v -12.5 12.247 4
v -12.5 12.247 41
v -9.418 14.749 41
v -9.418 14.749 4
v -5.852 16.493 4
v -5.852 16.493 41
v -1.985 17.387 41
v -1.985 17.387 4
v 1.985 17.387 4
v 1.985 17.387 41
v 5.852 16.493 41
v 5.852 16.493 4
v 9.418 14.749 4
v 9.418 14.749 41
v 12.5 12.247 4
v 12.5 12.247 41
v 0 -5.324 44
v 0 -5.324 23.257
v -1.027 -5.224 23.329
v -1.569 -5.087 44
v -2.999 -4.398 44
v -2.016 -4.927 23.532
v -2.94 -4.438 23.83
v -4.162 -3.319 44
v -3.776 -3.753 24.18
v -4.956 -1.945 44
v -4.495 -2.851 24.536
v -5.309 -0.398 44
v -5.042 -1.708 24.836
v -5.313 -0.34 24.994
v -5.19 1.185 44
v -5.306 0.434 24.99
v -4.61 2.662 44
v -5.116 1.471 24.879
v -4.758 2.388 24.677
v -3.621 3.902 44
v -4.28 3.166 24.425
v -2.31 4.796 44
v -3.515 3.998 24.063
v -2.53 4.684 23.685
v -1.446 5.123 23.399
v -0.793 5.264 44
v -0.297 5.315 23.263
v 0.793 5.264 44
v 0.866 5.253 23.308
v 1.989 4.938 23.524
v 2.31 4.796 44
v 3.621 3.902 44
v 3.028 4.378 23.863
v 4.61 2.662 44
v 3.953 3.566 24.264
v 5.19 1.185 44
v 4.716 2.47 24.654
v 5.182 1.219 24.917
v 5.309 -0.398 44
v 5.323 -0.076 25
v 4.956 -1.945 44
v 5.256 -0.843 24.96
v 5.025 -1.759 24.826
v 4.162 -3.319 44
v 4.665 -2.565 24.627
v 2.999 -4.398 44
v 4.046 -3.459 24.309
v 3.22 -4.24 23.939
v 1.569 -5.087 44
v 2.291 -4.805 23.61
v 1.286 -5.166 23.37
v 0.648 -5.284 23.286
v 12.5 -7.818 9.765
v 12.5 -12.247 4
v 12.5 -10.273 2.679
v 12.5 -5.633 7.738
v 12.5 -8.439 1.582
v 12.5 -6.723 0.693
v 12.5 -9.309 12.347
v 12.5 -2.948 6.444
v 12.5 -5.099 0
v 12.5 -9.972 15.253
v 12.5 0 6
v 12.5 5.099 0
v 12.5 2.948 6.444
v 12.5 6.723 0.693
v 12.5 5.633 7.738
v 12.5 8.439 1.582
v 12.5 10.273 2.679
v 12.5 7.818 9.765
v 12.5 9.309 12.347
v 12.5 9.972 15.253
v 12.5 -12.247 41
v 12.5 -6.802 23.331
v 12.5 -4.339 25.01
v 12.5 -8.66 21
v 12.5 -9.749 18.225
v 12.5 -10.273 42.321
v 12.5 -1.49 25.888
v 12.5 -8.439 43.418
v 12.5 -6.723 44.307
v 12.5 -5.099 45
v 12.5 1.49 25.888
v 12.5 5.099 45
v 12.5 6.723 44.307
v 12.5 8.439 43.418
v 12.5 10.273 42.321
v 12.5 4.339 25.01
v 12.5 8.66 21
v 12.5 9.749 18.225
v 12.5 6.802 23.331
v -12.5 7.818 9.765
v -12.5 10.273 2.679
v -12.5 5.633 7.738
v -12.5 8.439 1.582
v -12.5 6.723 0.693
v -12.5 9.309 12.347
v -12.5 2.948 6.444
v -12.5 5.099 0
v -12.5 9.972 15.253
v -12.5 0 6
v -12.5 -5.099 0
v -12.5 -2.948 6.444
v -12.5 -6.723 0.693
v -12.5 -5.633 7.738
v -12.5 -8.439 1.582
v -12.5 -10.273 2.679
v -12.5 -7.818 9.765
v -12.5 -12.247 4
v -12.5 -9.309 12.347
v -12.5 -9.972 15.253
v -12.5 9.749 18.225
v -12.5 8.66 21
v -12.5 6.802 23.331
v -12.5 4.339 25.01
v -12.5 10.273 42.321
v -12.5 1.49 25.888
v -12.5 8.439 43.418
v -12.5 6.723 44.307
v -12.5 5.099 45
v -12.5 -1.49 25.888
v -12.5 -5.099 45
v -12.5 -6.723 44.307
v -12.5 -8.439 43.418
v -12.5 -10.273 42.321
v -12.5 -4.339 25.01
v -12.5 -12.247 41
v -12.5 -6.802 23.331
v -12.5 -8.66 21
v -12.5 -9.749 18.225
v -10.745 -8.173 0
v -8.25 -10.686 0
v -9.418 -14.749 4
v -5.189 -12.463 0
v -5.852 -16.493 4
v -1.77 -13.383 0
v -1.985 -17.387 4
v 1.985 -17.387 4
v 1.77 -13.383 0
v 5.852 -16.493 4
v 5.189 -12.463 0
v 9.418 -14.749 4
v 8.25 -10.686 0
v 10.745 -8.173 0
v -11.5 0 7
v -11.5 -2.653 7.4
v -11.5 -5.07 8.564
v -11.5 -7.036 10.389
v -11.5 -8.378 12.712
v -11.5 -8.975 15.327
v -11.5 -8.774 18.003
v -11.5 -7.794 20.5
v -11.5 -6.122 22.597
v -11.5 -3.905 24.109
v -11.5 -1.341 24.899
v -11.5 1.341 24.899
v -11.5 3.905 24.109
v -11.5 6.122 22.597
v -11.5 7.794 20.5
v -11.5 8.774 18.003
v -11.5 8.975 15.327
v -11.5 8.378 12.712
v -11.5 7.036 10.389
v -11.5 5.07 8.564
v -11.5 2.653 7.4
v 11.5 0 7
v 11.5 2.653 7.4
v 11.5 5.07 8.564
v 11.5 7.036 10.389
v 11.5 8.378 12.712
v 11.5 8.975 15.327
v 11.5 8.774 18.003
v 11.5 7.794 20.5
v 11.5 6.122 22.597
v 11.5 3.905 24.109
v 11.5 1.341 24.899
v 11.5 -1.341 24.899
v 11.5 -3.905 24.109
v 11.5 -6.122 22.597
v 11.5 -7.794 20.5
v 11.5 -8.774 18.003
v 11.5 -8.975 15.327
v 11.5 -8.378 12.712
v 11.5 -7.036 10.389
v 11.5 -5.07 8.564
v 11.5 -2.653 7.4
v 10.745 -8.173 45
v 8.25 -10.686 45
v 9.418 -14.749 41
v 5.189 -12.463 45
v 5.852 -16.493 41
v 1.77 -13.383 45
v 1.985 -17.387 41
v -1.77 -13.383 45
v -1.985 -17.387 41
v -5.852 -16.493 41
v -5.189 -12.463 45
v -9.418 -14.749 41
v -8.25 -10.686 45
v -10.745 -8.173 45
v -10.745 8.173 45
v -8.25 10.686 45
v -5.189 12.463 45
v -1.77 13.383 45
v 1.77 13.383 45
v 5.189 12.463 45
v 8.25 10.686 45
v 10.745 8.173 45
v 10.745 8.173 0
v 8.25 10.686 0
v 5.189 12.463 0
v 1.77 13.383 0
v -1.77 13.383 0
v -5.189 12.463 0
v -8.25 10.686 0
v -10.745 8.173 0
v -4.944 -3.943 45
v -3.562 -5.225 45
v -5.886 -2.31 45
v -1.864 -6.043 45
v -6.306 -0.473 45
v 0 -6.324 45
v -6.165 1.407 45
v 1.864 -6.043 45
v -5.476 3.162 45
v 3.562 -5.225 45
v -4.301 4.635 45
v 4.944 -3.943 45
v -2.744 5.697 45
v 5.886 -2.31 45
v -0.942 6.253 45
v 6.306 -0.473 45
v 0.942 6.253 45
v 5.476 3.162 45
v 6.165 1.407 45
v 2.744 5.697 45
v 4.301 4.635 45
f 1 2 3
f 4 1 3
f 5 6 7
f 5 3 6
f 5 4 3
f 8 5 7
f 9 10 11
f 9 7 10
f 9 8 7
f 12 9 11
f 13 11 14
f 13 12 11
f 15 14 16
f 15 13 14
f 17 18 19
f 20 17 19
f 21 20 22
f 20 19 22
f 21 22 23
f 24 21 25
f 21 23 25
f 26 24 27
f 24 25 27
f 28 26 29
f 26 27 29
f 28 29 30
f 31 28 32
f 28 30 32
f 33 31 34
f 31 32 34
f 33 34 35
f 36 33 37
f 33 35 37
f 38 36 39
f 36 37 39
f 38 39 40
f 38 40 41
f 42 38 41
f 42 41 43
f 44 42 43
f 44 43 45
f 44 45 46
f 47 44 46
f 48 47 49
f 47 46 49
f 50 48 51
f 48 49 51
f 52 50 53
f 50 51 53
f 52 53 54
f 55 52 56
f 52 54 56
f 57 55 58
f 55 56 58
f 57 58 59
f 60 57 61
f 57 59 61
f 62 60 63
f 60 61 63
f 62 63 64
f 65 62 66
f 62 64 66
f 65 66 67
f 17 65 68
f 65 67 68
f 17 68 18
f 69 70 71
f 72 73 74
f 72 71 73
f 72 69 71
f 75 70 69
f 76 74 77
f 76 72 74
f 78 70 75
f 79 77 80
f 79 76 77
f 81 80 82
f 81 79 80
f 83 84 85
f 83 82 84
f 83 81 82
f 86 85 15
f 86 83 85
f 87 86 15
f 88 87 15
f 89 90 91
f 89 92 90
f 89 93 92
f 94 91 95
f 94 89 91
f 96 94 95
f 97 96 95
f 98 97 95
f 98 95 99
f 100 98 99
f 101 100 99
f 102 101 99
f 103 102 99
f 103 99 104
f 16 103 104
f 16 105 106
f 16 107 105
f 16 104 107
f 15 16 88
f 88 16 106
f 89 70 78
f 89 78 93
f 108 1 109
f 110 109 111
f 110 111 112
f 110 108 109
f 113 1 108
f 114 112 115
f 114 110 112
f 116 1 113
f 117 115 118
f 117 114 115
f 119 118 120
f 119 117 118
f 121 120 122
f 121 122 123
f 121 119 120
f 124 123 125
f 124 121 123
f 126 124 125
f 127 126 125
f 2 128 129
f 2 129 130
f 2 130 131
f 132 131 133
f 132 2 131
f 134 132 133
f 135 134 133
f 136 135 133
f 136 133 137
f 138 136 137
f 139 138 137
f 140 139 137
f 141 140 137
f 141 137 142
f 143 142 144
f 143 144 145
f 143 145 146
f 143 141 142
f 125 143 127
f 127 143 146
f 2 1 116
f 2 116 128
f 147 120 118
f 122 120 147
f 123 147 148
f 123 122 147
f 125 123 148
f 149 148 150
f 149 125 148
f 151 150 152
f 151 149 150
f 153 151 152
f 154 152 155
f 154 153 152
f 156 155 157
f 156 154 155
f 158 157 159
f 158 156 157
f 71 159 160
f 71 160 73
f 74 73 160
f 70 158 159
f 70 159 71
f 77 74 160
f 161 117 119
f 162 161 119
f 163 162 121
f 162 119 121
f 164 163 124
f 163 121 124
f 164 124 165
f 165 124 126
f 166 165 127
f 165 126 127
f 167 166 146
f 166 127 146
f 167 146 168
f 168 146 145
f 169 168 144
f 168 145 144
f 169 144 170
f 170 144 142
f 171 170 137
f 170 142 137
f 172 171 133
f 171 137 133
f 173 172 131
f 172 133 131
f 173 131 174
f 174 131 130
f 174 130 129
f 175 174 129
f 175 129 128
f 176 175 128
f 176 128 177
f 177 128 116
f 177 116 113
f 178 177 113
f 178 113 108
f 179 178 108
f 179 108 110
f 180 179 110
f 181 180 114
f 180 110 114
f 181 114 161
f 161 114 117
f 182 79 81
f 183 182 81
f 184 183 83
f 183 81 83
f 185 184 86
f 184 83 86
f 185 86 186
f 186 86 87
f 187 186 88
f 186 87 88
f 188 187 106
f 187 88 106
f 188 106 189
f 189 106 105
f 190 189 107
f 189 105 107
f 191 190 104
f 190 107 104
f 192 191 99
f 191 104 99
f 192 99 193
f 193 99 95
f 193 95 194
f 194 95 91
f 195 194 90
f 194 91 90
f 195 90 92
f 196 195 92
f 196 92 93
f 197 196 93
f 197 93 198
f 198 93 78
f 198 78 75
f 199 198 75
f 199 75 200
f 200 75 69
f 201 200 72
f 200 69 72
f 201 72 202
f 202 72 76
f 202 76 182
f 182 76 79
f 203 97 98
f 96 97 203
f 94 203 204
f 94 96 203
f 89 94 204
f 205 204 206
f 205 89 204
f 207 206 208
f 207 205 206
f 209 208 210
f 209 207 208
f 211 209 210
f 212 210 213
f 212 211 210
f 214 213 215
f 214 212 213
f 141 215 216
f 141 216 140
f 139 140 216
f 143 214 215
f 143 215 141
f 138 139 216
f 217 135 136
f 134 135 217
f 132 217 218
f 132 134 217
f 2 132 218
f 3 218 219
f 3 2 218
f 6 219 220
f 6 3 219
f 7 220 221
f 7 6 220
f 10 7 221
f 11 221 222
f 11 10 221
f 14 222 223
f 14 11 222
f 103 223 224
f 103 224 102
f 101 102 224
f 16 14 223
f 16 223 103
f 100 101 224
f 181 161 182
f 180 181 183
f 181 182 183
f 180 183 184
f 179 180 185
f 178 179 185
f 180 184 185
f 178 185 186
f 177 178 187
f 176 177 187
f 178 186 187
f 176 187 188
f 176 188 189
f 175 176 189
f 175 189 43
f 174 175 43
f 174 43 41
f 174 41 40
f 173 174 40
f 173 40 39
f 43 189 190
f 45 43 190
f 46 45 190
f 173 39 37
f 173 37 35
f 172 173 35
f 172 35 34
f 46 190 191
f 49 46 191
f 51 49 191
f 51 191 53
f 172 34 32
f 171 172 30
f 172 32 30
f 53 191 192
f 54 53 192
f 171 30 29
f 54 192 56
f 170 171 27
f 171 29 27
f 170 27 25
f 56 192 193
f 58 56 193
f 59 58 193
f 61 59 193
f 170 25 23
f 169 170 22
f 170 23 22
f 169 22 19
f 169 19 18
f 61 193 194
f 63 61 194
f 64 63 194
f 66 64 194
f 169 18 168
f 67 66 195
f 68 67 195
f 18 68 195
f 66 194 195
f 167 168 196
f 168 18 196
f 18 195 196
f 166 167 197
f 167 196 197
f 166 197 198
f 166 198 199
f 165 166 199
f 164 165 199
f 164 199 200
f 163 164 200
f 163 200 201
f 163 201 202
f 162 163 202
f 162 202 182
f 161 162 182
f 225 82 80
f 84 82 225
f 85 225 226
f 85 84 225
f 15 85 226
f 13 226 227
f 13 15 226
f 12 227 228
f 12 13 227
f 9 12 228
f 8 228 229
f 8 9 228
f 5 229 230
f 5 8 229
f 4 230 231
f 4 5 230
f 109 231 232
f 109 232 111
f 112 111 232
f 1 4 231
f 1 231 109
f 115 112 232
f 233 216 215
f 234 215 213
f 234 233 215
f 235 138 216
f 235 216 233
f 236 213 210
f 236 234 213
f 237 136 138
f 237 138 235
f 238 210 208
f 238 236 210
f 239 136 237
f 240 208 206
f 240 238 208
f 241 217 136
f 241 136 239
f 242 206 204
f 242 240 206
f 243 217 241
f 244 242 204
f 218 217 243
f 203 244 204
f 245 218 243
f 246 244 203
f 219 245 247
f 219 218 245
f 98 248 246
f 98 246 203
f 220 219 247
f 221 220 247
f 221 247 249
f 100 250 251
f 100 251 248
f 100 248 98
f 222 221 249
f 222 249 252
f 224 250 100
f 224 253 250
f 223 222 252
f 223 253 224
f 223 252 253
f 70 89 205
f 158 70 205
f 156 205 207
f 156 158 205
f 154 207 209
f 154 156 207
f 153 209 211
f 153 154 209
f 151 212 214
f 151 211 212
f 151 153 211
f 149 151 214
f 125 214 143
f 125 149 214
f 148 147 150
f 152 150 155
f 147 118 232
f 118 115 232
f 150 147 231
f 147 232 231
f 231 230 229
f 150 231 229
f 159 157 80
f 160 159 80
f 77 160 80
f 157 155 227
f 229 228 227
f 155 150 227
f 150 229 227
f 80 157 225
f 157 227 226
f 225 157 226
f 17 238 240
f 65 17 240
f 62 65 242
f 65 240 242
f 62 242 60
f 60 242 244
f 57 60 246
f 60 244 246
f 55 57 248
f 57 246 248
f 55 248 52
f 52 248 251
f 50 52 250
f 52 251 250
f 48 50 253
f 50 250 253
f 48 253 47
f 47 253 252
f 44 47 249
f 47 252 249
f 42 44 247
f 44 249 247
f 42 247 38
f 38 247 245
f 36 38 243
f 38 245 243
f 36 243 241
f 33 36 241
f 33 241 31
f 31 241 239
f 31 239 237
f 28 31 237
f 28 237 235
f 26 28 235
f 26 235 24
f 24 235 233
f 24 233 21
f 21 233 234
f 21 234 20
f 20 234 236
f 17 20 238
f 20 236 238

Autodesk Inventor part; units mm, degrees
ref_plane "YZ Plane" through (0, 0, 0) normal (1, 0, 0) x (0, 1, 0)
ref_plane "XZ Plane" through (0, 0, 0) normal (0, 1, 0) x (-1, 0, 0)
ref_plane "XY Plane" through (0, 0, 0) normal (0, 0, 1) x (1, 0, 0)
sketch "Sketch1" plane through (0, 0, 0) normal (0, 0, 1) x (1, 0, 0)
  circle A0 centre (0, 0) radius 17.5
  dimension "d0" = 35
extrude "Extrusion1" add sketch "Sketch1" along normal blind 45
sketch "Sketch2" plane through (0, 0, 45) normal (0, 0, 1) x (1, 0, 0)
  line L0 (12.5, 21.9531) -> (30.6636, 21.9531)
  line L1 (30.6636, 21.9531) -> (30.6636, -19.8764)
  line L2 (30.6636, -19.8764) -> (12.5, -19.8764)
  line L3 (12.5, -19.8764) -> (12.5, 21.9531)
  point P0 (0, 0)
  dimension "d3" = 12.5
extrude "Extrusion2" cut sketch "Sketch2" against normal through all
pattern_circular "Circular Pattern1" count 2 over 360 about axis through (0, 0, 0) along (0, 0, 1) of "Extrusion2"
sketch "Sketch3" plane through (12.5, -12.2474, 45) normal (1, 0, 0) x (0, 0, -1)
  circle A0 centre (29, 12.2474) radius 9
  line L0 (45, 24.4949) -> (45, 0) projected
  point P0 (45, 12.2474)
  point P1 (45, 12.2474)
  dimension "d9" = 18
  dimension "d10" = 16
extrude "Extrusion3" cut sketch "Sketch3" against normal through all
sketch "Sketch4" plane through (0, 0, 45) normal (0, 0, 1) x (1, 0, 0)
  arc A0 (12.5, 12.2474) -> (-12.5, 12.2474) centre (0, 0) ccw projected
hole "Hole1" at (0, 0, 45) direction (0, 0, -1) diameter 10.647 depth 25 tip angle 118 thread size "M12x1.25" class "6H" standard "ISO Metric profile"
chamfer "Chamfer1" distance 4 angle 45 4 edges at (0, 17.5, 0) (0, -17.5, 0) (0, 17.5, 45) (0, -17.5, 45)
chamfer "Chamfer2" distance 1 angle 45 1 edges at (0, 5.3235, 45)
chamfer "Chamfer3" distance 1 angle 45 2 edges at (12.5, 0, 25) (-12.5, 0, 25)
properties part number "IMS-01-001" material "Steel, Carbon"
